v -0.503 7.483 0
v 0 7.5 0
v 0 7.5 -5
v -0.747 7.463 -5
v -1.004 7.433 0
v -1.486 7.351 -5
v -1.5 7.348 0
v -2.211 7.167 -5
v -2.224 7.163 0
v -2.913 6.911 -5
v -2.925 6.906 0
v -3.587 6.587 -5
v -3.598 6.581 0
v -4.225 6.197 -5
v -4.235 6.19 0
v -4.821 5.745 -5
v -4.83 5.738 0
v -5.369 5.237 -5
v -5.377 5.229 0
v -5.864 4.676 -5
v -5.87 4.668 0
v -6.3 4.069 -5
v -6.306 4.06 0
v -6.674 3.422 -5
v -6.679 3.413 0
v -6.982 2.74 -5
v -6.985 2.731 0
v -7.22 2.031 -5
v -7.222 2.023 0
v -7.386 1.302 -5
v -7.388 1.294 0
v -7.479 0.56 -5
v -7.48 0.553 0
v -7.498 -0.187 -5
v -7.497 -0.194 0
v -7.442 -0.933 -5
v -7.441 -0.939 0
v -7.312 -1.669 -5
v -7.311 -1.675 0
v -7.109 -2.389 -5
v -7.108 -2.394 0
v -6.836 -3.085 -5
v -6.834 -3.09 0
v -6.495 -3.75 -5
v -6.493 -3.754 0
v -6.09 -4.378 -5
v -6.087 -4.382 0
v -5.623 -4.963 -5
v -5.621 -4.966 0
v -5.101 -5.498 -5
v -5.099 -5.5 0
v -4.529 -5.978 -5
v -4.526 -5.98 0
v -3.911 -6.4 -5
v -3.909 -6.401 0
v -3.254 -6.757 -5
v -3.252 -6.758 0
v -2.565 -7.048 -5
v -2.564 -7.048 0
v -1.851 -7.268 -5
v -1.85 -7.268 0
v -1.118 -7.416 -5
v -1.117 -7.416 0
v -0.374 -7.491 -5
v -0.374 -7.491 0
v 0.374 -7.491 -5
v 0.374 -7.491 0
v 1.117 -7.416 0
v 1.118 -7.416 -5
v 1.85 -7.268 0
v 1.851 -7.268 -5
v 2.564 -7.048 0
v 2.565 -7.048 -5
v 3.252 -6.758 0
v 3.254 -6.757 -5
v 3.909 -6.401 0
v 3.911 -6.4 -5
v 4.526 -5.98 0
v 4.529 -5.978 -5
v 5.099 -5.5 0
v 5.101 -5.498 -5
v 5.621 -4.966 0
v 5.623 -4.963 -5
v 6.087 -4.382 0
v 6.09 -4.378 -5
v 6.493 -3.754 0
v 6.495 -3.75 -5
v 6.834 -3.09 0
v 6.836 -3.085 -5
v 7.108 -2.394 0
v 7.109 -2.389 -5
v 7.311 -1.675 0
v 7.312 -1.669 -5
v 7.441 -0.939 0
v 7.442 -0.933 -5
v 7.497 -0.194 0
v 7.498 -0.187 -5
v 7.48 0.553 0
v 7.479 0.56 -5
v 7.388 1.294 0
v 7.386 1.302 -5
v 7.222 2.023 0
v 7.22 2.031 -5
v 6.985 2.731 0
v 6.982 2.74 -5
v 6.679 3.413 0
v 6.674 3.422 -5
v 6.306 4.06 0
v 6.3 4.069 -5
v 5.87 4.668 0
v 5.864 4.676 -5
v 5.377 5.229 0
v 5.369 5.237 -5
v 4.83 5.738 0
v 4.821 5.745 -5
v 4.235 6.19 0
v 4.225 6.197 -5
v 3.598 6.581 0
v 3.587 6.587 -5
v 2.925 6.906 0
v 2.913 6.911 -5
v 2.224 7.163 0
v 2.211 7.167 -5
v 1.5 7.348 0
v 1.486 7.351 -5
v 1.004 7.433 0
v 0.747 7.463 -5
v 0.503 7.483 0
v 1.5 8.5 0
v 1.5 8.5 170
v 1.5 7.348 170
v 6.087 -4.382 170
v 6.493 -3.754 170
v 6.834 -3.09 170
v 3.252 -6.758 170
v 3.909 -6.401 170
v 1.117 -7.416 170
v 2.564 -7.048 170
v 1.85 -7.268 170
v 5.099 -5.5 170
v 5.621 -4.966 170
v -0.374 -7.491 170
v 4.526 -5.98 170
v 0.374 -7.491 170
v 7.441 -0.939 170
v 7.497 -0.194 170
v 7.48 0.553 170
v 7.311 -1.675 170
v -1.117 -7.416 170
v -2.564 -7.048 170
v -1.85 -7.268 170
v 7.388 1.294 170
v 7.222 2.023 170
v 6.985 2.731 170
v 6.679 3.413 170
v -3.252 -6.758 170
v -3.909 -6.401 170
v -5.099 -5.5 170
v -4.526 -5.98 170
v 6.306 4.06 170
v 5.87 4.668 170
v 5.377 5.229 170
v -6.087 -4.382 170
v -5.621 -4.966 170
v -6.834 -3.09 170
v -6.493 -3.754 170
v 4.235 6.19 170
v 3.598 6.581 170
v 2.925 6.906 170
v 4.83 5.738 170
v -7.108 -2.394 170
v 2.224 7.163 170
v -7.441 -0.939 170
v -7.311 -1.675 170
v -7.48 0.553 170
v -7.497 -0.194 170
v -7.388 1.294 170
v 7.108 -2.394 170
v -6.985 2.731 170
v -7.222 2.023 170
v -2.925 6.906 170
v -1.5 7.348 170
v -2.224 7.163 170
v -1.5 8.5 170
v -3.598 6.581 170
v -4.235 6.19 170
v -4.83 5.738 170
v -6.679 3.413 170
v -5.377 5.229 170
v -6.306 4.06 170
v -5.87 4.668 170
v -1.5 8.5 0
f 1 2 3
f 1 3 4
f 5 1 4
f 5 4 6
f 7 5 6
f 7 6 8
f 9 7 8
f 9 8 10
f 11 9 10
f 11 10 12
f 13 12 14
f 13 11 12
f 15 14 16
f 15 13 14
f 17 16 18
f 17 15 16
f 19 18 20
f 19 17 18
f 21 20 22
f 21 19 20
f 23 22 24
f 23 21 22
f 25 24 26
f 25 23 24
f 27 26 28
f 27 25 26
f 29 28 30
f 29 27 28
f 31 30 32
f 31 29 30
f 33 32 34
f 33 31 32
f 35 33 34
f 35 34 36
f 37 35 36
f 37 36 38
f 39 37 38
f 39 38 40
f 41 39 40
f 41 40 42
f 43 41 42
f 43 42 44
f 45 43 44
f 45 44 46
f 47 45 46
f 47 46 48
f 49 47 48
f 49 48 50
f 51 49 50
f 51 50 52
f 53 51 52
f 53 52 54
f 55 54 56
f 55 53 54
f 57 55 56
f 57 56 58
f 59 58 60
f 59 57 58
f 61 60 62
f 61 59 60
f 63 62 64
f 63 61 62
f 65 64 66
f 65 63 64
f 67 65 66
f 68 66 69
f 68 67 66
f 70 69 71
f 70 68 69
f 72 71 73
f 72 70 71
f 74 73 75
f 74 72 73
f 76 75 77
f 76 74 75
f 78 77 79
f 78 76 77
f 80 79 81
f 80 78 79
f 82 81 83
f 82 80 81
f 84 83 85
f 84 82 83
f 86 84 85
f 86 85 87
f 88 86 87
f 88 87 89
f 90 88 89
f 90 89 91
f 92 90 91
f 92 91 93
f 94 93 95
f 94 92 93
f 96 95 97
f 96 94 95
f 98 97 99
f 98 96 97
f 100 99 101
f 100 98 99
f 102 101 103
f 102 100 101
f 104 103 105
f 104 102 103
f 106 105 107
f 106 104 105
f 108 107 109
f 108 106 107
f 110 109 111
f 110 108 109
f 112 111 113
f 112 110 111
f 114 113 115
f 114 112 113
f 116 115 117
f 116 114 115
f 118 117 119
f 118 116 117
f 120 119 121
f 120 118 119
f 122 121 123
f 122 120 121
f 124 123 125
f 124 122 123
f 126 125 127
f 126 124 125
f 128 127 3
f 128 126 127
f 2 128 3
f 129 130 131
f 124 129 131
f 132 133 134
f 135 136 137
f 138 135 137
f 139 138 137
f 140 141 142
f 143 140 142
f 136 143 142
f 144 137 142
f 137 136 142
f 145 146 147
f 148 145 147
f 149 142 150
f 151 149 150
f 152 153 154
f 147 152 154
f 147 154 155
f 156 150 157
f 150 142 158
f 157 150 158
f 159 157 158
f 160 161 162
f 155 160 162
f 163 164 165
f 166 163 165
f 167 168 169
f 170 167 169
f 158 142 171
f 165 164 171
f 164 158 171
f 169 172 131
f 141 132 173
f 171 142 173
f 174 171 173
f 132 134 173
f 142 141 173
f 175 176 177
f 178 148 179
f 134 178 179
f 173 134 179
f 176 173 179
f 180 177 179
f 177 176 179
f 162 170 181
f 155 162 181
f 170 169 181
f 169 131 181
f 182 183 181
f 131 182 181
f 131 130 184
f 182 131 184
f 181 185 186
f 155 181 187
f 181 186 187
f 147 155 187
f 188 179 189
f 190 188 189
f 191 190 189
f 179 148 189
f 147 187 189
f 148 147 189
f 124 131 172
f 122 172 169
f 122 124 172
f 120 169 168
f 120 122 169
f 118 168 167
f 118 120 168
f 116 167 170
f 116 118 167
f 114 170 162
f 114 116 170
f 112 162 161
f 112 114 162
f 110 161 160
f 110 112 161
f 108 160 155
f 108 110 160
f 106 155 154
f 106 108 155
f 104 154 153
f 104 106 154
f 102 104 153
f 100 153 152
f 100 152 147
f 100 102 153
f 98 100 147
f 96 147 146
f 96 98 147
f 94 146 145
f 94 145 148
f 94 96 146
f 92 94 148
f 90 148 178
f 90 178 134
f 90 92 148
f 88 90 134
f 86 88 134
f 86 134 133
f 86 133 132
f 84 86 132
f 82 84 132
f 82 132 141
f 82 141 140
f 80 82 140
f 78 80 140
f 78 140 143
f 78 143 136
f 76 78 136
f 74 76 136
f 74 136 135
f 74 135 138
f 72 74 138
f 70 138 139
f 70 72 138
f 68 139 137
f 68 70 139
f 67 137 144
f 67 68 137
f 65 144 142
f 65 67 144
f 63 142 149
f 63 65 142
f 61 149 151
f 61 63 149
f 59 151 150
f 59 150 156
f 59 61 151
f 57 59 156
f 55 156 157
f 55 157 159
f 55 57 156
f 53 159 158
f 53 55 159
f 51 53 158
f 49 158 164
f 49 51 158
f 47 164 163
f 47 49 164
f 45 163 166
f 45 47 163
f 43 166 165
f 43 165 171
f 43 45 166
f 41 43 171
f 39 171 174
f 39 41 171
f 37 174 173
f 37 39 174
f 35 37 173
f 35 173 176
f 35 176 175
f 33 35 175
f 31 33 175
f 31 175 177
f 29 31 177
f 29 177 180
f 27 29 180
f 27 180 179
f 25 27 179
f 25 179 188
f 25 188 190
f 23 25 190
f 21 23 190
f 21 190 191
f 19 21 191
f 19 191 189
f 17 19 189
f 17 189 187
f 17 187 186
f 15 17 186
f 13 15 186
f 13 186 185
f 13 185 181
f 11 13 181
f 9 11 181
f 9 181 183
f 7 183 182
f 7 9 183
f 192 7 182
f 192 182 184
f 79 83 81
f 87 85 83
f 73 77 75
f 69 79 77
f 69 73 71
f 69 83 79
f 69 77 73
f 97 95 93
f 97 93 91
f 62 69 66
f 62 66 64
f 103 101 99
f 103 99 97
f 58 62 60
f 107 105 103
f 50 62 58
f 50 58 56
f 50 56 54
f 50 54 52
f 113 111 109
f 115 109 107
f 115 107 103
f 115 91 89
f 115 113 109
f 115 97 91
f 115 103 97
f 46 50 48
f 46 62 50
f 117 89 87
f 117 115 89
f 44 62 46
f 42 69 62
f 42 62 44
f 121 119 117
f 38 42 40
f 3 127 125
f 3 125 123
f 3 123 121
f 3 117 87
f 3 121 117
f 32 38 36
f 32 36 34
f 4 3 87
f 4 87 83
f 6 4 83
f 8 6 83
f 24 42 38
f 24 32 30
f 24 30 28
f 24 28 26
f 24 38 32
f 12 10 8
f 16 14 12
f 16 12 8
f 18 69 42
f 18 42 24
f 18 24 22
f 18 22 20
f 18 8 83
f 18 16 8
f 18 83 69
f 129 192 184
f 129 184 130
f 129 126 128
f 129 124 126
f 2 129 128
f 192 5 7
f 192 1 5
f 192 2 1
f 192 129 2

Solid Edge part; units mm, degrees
sketch "Sketch1" plane through (0, 0, 0) normal (0, 0, 1) x (1, 0, 0)
  line L0 (-1.5, 8.5) -> (1.5, 8.5)
  line L1 (-1.5, 7.3485) -> (-1.5, 8.5)
  line L2 (-1.5, 7.3485) -> (-1.5, 8.5) construction
  line L3 (1.5, 8.5) -> (1.5, 7.3485)
  arc A0 (1.5, 7.3485) -> (-1.5, 7.3485) centre (0, 0) cw
  dimension "D1" = 15
  dimension "D2" = 3
  dimension "D3" = 2
  dimension "D4" = 6.5
extrude "Protrusion1" add sketch "Sketch1" along normal blind 170
sketch "Sketch2" plane through (0, 0.5, 0) normal (0, 0, -1) x (0, 1, 0)
  circle A0 centre (-0.5, 0) radius 7.5
extrude "ExtrudedProtrusion_2" add sketch "Sketch2" along normal blind 5
